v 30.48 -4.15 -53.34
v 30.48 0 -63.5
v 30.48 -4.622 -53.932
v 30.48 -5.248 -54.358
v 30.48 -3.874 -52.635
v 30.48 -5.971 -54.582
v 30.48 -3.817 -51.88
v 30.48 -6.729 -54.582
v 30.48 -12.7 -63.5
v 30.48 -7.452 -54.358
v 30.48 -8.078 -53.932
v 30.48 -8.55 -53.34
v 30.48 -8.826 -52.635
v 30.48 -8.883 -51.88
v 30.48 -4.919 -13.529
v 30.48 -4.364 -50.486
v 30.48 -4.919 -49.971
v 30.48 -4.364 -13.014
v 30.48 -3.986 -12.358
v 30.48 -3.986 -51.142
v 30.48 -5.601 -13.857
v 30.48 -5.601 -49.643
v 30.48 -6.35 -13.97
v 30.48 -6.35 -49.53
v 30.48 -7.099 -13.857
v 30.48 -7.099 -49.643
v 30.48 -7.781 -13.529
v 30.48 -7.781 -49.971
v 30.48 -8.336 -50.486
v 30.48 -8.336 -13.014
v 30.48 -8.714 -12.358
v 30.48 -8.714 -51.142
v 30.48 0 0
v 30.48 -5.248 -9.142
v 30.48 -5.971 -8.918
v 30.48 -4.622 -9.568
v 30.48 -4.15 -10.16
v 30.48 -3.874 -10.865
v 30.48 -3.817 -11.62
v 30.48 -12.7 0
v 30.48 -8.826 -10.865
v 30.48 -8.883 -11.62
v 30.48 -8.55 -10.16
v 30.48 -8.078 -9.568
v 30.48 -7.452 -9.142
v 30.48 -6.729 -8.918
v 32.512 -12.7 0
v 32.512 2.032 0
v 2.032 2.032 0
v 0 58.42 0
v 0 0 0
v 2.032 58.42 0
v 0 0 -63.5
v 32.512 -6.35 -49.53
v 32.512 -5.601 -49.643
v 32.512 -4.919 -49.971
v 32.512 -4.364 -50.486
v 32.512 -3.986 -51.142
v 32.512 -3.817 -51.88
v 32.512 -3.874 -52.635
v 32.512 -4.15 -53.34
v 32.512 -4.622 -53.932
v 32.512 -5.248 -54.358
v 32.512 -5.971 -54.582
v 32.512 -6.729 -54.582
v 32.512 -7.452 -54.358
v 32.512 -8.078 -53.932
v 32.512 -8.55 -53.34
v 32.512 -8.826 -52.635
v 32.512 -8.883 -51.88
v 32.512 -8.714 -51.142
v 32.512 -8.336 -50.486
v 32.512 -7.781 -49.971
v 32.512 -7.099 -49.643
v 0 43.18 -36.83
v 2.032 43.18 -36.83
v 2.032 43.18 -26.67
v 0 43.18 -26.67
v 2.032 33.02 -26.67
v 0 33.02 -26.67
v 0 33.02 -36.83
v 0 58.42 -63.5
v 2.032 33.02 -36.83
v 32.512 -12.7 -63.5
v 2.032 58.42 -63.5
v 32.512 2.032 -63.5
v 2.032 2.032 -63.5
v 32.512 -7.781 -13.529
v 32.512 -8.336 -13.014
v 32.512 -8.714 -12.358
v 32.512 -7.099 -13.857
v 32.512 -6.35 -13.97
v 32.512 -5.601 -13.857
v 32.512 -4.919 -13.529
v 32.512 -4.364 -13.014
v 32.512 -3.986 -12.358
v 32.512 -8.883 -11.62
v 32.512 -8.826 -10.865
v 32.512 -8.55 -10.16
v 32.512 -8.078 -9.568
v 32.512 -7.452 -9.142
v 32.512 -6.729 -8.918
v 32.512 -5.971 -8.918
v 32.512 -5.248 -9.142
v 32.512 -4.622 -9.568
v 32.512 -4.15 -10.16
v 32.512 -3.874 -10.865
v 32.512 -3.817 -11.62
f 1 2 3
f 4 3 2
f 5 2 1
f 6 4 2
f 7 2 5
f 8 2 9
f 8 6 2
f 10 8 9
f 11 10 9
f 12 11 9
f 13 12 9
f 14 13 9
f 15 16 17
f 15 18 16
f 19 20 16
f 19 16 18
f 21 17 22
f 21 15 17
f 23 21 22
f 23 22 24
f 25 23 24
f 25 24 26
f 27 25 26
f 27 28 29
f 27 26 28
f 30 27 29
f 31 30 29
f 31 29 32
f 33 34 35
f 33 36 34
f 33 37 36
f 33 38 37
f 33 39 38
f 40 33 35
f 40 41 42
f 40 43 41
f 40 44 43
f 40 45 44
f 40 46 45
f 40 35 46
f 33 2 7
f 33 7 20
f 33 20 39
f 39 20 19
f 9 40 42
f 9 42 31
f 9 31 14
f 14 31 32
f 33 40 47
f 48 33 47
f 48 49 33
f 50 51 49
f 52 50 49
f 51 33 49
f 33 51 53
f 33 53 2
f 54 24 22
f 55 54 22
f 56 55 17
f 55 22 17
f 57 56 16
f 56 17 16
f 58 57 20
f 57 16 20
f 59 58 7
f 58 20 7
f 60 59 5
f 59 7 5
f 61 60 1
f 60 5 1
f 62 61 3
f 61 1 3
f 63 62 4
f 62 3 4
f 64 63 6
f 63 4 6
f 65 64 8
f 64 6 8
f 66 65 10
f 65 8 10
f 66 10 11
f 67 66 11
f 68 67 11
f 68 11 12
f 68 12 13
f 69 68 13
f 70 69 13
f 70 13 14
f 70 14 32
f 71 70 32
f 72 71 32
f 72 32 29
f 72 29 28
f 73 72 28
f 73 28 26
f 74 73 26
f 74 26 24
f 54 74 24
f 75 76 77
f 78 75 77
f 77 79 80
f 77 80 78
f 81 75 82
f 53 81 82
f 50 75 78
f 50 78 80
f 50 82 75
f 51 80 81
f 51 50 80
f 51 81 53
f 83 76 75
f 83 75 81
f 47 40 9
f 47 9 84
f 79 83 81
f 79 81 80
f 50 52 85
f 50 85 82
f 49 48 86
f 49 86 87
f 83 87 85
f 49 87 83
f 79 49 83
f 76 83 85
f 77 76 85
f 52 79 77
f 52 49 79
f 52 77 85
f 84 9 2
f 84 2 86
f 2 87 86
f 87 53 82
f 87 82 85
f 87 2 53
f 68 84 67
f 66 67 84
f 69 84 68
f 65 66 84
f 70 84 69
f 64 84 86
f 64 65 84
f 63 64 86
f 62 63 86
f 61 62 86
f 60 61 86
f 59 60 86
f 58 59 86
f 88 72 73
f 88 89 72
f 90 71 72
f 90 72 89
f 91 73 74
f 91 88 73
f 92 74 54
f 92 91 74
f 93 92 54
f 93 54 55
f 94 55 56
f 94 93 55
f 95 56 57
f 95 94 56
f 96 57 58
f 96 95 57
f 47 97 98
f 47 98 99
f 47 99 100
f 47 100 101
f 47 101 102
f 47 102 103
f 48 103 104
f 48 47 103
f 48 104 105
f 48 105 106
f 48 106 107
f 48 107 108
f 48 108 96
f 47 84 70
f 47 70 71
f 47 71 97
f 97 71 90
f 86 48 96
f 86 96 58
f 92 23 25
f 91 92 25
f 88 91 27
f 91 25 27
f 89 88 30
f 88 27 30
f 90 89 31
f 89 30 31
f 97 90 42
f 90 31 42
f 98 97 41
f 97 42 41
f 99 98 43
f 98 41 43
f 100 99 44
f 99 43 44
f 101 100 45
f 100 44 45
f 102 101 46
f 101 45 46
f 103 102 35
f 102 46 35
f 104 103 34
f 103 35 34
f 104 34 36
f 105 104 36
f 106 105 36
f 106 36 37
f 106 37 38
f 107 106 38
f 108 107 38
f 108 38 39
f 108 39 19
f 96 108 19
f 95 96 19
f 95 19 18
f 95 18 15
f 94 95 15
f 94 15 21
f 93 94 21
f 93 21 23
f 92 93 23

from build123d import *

# Parameters (mm, degrees)
BOSS_EXTRUDE1_DEPTH = 63.5
CUT_EXTRUDE1_DEPTH  = 92.510528356
SKETCH4_R           = 2.54
CUT_EXTRUDE2_DEPTH  = 92.510528356


with BuildPart() as part:
    # Sketch1 → Boss-Extrude1 (new body)
    with BuildSketch(Plane.XY):
        Polygon((0, 0), (30.48, 0), (30.48, -12.7), (32.512, -12.7), (32.512, 2.032), (2.032, 2.032), (2.032, 58.42), (0, 58.42), align=None)
    extrude(amount=-BOSS_EXTRUDE1_DEPTH)

    # Sketch2 → Cut-Extrude1 (cut, through all)
    with BuildSketch(Plane(origin=(2.032, 0, 0), x_dir=(0, 0, -1), z_dir=(1, 0, 0))):
        Polygon((31.75, 43.18), (36.83, 43.18), (36.83, 33.02), (26.67, 33.02), (26.67, 43.18), align=None)
    extrude(amount=-CUT_EXTRUDE1_DEPTH, mode=Mode.SUBTRACT)

    # Sketch4 → Cut-Extrude2 (cut, through all)
    with BuildSketch(Plane.ZY.offset(-30.48)):
        with Locations((-52.07, -6.35)):
            Circle(SKETCH4_R)
        with Locations(Location((-11.43, -6.35, 0), (0, 0, 180))):
            Circle(SKETCH4_R)
    extrude(amount=-CUT_EXTRUDE2_DEPTH, mode=Mode.SUBTRACT)


solid = part.part
